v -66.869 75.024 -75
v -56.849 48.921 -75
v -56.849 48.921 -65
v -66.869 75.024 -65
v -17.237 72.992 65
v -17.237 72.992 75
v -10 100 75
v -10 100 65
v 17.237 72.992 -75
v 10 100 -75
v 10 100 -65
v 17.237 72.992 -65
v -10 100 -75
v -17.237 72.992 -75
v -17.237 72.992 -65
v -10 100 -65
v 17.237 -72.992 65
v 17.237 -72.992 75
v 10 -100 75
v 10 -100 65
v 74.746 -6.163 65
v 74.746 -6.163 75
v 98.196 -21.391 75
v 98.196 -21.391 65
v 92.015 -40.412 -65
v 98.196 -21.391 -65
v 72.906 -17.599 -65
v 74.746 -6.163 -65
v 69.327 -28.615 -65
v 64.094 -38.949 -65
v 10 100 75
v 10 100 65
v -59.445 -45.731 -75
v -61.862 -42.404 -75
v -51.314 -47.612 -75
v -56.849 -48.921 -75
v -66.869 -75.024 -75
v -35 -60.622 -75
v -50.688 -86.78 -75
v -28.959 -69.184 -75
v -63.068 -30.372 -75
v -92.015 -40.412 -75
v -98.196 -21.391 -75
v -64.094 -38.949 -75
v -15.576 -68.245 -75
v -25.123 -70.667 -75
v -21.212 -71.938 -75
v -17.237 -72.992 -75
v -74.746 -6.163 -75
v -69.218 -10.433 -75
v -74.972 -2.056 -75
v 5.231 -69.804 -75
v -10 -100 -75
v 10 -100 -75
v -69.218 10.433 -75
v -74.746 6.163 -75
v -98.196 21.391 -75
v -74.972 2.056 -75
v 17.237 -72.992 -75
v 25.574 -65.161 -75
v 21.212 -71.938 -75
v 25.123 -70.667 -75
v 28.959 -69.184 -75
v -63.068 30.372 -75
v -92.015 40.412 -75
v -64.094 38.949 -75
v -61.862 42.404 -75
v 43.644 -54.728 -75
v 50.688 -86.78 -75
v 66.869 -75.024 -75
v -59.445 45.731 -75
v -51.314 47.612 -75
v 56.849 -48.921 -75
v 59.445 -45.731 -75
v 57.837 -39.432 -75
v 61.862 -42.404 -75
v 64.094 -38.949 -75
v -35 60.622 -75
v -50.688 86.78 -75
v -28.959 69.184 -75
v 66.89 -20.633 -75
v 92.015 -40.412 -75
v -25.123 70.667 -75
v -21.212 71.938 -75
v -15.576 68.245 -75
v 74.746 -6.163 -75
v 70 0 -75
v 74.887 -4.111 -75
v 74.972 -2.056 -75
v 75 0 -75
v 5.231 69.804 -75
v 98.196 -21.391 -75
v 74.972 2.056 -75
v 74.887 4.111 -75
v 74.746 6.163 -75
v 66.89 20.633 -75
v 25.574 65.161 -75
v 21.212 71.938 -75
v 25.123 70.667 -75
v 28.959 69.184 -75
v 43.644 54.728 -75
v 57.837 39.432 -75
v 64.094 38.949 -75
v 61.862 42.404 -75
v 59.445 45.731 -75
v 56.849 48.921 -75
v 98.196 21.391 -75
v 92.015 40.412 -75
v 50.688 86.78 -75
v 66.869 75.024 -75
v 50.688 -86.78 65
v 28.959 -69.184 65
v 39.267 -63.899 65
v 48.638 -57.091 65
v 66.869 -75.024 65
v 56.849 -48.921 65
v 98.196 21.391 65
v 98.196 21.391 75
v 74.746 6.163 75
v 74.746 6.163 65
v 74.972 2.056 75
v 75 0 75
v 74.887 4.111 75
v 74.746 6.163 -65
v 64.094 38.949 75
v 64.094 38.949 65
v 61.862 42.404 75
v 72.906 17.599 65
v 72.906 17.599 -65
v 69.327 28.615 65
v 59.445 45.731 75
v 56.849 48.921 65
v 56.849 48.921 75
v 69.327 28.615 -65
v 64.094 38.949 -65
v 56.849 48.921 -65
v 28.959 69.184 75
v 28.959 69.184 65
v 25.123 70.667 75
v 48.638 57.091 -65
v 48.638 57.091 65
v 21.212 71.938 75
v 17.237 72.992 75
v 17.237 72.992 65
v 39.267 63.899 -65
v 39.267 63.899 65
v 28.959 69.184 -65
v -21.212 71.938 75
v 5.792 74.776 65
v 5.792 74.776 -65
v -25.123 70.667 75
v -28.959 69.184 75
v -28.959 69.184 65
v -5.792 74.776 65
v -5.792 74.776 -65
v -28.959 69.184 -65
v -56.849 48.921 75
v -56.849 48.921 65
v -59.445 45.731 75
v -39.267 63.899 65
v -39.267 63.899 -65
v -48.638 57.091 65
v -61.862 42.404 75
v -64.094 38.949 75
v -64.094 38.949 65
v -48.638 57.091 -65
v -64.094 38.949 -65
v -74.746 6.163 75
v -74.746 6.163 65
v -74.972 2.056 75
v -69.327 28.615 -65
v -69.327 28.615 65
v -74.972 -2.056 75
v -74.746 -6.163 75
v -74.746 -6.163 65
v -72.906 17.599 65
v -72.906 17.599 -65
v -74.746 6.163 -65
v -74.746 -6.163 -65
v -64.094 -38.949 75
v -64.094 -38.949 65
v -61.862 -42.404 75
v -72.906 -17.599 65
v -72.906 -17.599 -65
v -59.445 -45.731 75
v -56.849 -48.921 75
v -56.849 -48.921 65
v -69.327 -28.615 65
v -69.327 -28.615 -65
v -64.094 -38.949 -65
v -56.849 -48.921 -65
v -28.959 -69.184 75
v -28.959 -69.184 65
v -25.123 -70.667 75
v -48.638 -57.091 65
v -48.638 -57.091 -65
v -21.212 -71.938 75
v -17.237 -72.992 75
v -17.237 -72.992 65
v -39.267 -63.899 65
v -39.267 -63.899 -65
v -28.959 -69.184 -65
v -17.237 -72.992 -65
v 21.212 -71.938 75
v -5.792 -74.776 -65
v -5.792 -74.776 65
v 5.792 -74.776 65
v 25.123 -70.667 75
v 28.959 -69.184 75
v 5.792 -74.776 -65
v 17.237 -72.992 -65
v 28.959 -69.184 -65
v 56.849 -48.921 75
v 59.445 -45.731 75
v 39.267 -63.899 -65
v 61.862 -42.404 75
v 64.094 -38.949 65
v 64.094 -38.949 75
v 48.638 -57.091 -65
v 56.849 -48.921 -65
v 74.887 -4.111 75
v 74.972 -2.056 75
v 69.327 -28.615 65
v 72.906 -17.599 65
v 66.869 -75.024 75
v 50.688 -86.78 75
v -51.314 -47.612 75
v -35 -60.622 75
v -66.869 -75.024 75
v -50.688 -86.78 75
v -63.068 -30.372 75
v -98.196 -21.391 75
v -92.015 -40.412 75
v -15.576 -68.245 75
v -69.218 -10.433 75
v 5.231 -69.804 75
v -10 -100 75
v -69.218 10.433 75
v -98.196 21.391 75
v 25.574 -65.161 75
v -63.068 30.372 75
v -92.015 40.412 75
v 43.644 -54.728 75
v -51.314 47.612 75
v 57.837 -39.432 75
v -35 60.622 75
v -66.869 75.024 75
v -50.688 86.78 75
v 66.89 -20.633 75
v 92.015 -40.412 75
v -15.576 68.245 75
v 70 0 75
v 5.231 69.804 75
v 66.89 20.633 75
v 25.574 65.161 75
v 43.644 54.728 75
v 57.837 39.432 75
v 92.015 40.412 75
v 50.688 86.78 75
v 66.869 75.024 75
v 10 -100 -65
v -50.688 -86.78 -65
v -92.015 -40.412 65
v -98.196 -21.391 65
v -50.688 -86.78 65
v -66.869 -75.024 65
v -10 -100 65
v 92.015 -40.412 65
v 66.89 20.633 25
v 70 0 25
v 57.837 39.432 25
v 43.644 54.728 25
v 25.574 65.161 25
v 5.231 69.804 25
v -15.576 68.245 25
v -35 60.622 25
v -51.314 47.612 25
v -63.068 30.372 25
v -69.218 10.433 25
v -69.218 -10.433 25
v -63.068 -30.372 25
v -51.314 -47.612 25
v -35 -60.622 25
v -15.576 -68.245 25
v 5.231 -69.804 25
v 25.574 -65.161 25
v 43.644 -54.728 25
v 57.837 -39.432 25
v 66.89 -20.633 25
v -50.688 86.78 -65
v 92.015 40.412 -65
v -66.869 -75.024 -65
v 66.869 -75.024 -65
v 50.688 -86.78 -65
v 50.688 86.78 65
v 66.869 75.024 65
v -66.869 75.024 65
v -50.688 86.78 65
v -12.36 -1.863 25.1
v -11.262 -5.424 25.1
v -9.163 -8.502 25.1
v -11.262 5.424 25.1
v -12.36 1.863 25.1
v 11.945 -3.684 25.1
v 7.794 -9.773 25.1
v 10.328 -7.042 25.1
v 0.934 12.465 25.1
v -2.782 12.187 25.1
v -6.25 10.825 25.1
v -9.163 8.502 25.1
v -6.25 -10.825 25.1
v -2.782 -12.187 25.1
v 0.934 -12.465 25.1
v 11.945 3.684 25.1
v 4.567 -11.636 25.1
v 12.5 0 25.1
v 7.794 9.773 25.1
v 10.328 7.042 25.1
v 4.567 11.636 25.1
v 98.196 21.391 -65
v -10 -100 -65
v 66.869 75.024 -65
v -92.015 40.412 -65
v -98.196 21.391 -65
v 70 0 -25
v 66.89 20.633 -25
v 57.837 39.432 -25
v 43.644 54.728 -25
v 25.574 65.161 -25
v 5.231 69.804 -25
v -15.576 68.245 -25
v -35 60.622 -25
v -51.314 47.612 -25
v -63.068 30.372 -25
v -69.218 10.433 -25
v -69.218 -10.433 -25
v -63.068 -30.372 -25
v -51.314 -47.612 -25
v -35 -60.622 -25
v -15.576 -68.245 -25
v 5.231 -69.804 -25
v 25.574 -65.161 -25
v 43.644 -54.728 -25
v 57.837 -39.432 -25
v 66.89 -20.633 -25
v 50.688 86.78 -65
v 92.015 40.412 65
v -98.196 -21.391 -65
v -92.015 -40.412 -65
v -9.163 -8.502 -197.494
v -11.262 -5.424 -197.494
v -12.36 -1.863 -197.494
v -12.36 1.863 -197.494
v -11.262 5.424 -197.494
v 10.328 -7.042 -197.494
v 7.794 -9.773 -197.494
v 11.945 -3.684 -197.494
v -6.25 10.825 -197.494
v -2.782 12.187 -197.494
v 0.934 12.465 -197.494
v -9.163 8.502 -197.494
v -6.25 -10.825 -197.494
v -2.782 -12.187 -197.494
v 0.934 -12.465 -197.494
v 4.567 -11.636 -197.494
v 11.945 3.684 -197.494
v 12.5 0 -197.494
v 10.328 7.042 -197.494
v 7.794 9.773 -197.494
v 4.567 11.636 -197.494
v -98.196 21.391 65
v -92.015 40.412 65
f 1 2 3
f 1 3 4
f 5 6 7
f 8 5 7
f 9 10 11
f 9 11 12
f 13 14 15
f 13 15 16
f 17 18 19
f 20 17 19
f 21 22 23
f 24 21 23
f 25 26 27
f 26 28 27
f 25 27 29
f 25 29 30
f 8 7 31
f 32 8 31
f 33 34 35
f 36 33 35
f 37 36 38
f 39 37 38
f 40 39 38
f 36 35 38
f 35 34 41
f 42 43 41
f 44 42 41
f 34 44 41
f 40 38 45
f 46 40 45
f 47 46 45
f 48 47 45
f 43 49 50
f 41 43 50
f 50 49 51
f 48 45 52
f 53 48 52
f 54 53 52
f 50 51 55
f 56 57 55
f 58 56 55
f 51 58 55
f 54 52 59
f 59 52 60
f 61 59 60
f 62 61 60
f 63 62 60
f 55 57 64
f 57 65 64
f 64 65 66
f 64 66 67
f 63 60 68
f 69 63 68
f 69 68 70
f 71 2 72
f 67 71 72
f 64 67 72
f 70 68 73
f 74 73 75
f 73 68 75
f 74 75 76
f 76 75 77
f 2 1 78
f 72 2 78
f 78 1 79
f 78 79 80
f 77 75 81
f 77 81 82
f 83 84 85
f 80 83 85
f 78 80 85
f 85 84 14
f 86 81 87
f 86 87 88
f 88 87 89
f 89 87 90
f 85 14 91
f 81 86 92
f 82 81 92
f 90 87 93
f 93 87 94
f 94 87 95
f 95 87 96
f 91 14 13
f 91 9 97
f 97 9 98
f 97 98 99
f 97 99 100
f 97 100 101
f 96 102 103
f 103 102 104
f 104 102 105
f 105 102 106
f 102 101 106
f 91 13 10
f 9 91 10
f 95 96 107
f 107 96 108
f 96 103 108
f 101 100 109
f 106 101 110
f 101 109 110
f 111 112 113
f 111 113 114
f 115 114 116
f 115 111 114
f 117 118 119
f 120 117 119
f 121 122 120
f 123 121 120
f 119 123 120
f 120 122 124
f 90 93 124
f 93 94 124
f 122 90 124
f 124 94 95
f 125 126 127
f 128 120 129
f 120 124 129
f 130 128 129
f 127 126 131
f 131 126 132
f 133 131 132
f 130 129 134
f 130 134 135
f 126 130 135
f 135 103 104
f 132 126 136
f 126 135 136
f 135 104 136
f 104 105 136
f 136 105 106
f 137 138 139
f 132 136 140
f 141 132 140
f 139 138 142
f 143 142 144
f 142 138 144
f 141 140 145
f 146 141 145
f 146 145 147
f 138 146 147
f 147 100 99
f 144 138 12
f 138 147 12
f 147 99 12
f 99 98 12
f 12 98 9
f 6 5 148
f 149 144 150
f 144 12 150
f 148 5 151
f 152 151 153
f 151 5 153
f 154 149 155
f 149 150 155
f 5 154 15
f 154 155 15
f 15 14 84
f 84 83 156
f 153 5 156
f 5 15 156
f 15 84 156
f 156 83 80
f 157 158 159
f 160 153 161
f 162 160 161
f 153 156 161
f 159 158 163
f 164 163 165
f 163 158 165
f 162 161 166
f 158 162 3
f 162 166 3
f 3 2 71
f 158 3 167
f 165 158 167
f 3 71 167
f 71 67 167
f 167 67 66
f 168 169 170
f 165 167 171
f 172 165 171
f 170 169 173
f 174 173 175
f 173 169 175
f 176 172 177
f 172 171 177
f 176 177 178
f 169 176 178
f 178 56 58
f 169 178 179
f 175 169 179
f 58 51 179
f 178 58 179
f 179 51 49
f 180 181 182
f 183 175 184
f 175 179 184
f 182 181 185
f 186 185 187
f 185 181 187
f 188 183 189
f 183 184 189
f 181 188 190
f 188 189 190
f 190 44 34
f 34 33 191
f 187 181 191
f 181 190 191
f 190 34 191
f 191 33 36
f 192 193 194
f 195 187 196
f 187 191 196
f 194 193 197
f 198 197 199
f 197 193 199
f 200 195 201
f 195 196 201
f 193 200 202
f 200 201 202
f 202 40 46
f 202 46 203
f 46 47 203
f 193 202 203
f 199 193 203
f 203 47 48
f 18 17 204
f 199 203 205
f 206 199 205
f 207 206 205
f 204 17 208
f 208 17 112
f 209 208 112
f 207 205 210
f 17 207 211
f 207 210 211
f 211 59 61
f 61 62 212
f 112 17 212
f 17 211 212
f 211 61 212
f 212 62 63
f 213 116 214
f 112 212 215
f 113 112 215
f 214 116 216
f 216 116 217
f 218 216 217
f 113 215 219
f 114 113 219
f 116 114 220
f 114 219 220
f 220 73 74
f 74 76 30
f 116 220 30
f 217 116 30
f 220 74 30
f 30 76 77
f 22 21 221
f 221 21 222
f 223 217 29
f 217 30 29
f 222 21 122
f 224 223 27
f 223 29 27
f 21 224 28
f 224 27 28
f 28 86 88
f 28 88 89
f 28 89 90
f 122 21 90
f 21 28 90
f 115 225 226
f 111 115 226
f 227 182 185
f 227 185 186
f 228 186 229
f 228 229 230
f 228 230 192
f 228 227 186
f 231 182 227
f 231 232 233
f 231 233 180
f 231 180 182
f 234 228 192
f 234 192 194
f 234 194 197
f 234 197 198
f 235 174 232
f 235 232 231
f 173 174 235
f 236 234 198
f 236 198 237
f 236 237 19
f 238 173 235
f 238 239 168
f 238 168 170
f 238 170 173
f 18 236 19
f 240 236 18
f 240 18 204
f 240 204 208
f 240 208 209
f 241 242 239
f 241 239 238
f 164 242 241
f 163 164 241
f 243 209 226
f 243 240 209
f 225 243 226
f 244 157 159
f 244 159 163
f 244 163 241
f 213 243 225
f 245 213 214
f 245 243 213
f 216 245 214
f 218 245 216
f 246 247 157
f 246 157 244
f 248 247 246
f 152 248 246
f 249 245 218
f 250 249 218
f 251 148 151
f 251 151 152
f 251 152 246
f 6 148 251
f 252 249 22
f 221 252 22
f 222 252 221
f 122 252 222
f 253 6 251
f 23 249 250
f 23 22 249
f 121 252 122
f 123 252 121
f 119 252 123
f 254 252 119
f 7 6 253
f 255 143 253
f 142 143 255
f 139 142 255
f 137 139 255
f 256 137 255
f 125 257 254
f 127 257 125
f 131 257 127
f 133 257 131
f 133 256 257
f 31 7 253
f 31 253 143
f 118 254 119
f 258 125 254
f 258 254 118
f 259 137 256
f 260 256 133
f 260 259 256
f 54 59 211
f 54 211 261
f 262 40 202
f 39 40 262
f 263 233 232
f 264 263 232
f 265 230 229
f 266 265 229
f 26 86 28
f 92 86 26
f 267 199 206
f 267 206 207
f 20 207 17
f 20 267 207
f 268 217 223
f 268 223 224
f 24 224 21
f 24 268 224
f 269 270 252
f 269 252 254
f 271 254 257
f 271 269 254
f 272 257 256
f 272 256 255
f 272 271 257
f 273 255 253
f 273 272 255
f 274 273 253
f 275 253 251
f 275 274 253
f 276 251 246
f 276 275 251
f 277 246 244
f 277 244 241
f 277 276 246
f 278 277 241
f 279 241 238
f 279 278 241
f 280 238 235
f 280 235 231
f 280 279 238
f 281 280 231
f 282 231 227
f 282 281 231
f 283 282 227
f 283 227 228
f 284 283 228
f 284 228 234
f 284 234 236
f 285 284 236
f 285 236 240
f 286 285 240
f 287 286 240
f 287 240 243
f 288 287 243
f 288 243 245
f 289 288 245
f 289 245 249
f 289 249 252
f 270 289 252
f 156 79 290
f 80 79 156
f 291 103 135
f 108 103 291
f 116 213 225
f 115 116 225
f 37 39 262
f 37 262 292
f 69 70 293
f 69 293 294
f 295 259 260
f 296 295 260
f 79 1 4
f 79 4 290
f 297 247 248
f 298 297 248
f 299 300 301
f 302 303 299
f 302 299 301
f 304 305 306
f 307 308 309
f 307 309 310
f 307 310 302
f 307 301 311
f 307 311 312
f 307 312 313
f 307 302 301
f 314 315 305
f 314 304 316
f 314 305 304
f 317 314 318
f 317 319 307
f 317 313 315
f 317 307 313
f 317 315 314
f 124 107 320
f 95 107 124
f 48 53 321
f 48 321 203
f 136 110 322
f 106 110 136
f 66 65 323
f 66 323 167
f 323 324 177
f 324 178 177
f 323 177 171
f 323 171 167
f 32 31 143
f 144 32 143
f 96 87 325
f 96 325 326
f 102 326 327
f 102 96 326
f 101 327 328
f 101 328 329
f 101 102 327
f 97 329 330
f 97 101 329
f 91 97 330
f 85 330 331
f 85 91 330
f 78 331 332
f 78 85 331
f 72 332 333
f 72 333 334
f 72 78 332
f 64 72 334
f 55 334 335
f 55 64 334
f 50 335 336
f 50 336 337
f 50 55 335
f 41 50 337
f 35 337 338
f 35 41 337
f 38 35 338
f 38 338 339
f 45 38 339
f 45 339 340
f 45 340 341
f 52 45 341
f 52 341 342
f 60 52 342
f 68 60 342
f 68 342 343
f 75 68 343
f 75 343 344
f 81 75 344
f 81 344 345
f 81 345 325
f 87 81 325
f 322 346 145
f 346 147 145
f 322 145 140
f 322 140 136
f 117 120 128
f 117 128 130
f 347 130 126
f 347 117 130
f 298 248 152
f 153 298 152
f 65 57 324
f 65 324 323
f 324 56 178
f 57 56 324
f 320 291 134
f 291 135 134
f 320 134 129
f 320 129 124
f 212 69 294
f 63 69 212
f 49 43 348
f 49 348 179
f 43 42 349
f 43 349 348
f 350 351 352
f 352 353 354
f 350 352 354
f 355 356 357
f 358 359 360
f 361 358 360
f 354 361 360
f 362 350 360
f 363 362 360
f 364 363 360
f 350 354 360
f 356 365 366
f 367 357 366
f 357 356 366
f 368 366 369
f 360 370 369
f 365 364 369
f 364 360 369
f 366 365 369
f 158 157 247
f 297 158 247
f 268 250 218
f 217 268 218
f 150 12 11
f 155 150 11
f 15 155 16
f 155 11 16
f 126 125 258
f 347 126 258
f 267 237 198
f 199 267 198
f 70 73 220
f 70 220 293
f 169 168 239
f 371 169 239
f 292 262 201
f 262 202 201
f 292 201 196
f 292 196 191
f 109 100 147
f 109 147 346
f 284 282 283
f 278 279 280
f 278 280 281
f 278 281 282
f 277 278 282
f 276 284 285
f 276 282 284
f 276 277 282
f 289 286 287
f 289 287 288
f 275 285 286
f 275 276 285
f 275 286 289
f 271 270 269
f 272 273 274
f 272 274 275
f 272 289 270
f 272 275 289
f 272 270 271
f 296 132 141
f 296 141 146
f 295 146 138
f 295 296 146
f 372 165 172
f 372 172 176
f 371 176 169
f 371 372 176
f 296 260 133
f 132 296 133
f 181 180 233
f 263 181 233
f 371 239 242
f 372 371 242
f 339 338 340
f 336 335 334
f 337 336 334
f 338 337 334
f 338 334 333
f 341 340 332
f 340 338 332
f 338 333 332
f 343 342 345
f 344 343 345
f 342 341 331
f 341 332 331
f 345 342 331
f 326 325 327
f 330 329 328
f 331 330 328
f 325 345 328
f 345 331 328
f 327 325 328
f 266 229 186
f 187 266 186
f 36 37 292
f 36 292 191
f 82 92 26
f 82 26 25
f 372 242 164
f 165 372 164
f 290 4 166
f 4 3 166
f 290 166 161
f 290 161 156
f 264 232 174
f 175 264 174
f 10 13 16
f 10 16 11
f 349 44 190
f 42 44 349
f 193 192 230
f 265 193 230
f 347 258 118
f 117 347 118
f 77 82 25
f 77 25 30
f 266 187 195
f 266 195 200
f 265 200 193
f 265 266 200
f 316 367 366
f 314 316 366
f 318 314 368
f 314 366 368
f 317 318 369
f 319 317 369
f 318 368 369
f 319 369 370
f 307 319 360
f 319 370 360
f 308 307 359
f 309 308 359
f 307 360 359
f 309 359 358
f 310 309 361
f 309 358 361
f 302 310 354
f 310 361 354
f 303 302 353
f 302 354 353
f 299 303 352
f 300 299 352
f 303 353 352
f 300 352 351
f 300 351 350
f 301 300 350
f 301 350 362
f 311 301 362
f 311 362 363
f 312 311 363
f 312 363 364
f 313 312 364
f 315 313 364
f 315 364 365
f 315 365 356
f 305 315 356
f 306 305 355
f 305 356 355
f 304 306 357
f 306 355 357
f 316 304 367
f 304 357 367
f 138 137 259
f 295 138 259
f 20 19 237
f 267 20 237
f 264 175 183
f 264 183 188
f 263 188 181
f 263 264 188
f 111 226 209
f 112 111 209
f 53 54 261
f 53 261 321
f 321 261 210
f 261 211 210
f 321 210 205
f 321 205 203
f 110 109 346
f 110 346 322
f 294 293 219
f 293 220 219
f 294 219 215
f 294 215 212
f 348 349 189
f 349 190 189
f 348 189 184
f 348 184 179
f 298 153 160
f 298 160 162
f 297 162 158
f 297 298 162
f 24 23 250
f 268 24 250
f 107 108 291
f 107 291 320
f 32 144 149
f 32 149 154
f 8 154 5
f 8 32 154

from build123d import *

# Parameters (mm, degrees)
BOSS_EXTRUDE1_DEPTH      = 25
BOSS_EXTRUDE1_DEPTH_BACK = 25
SKETCH2_R                = 70
BOSS_EXTRUDE2_DEPTH      = 50
BOSS_EXTRUDE2_DEPTH_BACK = 100
SKETCH3_R                = 75
SKETCH3_R_2              = 70
BOSS_EXTRUDE3_DEPTH      = 10
CIRPATTERN1_COUNT        = 10
MIRROR1_COPY_1_DEPTH     = 10
MIRROR1_COPY_2_DEPTH     = 10
MIRROR1_COPY_3_DEPTH     = 10
MIRROR1_COPY_4_DEPTH     = 10
MIRROR1_COPY_5_DEPTH     = 10
MIRROR1_COPY_6_DEPTH     = 10
MIRROR1_COPY_7_DEPTH     = 10
MIRROR1_COPY_8_DEPTH     = 10
MIRROR1_COPY_9_DEPTH     = 10
MIRROR1_COPY_10_DEPTH    = 10
BOSS_EXTRUDE4_DEPTH      = 0.1
BOSS_EXTRUDE4_DEPTH_BACK = 222.49372628
SKETCH5_R                = 12.5


with BuildPart() as part:
    # Sketch2 → Boss-Extrude1 (new, two sides: drawn at the far end of the back side and taken through both)
    with BuildSketch(Plane.XY.offset(-BOSS_EXTRUDE1_DEPTH_BACK)):
        Circle(SKETCH2_R)
    extrude(amount=BOSS_EXTRUDE1_DEPTH + BOSS_EXTRUDE1_DEPTH_BACK)

    # Sketch3 → Boss-Extrude2 (add, two sides: drawn at the far end of the back side and taken through both)
    with BuildSketch(Plane.XY.offset(25).offset(-BOSS_EXTRUDE2_DEPTH_BACK)):
        Circle(SKETCH3_R)
        Circle(SKETCH3_R_2, mode=Mode.SUBTRACT)
    extrude(amount=BOSS_EXTRUDE2_DEPTH + BOSS_EXTRUDE2_DEPTH_BACK)

    # Sketch4 → Boss-Extrude3 (add)
    with BuildSketch(Plane.XY.offset(75)):
        with BuildLine():
            Line((-10, 100), (10, 100))
            Line((10, 100), (17.23665102, 72.992450717))
            ThreePointArc((17.23665102, 72.992450717), (0, 75), (-17.23665102, 72.992450717))
            Line((-17.23665102, 72.992450717), (-10, 100))
        make_face()
    boss_extrude3 = extrude(amount=-BOSS_EXTRUDE3_DEPTH)

    # CirPattern1: Boss-Extrude3 ×10 about axis
    cirpattern1_axis = Axis((0, 0, 75), (0, 0, 1))
    for i in range(1, CIRPATTERN1_COUNT):
        add(boss_extrude3.rotate(cirpattern1_axis, i * 360 / CIRPATTERN1_COUNT))

    # Mirror1 copy 1 sketch → Mirror1 copy 1 (add)
    with BuildSketch(Plane(origin=(0, 0, -75), x_dir=(0.8090169943749475, 0.5877852522924731, 0), z_dir=(0, 0, -1))):
        with BuildLine():
            Line((-10, -100), (10, -100))
            Line((10, -100), (17.23665102, -72.992450717))
            ThreePointArc((17.23665102, -72.992450717), (0, -75), (-17.23665102, -72.992450717))
            Line((-17.23665102, -72.992450717), (-10, -100))
        make_face()
    extrude(amount=-MIRROR1_COPY_1_DEPTH)

    # Mirror1 copy 2 sketch → Mirror1 copy 2 (add)
    with BuildSketch(Plane(origin=(0, 0, -75), x_dir=(0.30901699437494745, 0.9510565162951535, 0), z_dir=(0, 0, -1))):
        with BuildLine():
            Line((-10, -100), (10, -100))
            Line((10, -100), (17.23665102, -72.992450717))
            ThreePointArc((17.23665102, -72.992450717), (0, -75), (-17.23665102, -72.992450717))
            Line((-17.23665102, -72.992450717), (-10, -100))
        make_face()
    extrude(amount=-MIRROR1_COPY_2_DEPTH)

    # Mirror1 copy 3 sketch → Mirror1 copy 3 (add)
    with BuildSketch(Plane(origin=(0, 0, -75), x_dir=(-0.30901699437494734, 0.9510565162951536, 0), z_dir=(0, 0, -1))):
        with BuildLine():
            Line((-10, -100), (10, -100))
            Line((10, -100), (17.23665102, -72.992450717))
            ThreePointArc((17.23665102, -72.992450717), (0, -75), (-17.23665102, -72.992450717))
            Line((-17.23665102, -72.992450717), (-10, -100))
        make_face()
    extrude(amount=-MIRROR1_COPY_3_DEPTH)

    # Mirror1 copy 4 sketch → Mirror1 copy 4 (add)
    with BuildSketch(Plane(origin=(0, 0, -75), x_dir=(-0.8090169943749473, 0.5877852522924732, 0), z_dir=(0, 0, -1))):
        with BuildLine():
            Line((-10, -100), (10, -100))
            Line((10, -100), (17.23665102, -72.992450717))
            ThreePointArc((17.23665102, -72.992450717), (0, -75), (-17.23665102, -72.992450717))
            Line((-17.23665102, -72.992450717), (-10, -100))
        make_face()
    extrude(amount=-MIRROR1_COPY_4_DEPTH)

    # Mirror1 copy 5 sketch → Mirror1 copy 5 (add)
    with BuildSketch(Plane(origin=(0, 0, -75), x_dir=(-1, 0, 0), z_dir=(0, 0, -1))):
        with BuildLine():
            Line((-10, -100), (10, -100))
            Line((10, -100), (17.23665102, -72.992450717))
            ThreePointArc((17.23665102, -72.992450717), (0, -75), (-17.23665102, -72.992450717))
            Line((-17.23665102, -72.992450717), (-10, -100))
        make_face()
    extrude(amount=-MIRROR1_COPY_5_DEPTH)

    # Mirror1 copy 6 sketch → Mirror1 copy 6 (add)
    with BuildSketch(Plane(origin=(0, 0, -75), x_dir=(-0.8090169943749476, -0.587785252292473, 0), z_dir=(0, 0, -1))):
        with BuildLine():
            Line((-10, -100), (10, -100))
            Line((10, -100), (17.23665102, -72.992450717))
            ThreePointArc((17.23665102, -72.992450717), (0, -75), (-17.23665102, -72.992450717))
            Line((-17.23665102, -72.992450717), (-10, -100))
        make_face()
    extrude(amount=-MIRROR1_COPY_6_DEPTH)

    # Mirror1 copy 7 sketch → Mirror1 copy 7 (add)
    with BuildSketch(Plane(origin=(0, 0, -75), x_dir=(-0.30901699437494756, -0.9510565162951535, 0), z_dir=(0, 0, -1))):
        with BuildLine():
            Line((-10, -100), (10, -100))
            Line((10, -100), (17.23665102, -72.992450717))
            ThreePointArc((17.23665102, -72.992450717), (0, -75), (-17.23665102, -72.992450717))
            Line((-17.23665102, -72.992450717), (-10, -100))
        make_face()
    extrude(amount=-MIRROR1_COPY_7_DEPTH)

    # Mirror1 copy 8 sketch → Mirror1 copy 8 (add)
    with BuildSketch(Plane(origin=(0, 0, -75), x_dir=(0.30901699437494723, -0.9510565162951536, 0), z_dir=(0, 0, -1))):
        with BuildLine():
            Line((-10, -100), (10, -100))
            Line((10, -100), (17.23665102, -72.992450717))
            ThreePointArc((17.23665102, -72.992450717), (0, -75), (-17.23665102, -72.992450717))
            Line((-17.23665102, -72.992450717), (-10, -100))
        make_face()
    extrude(amount=-MIRROR1_COPY_8_DEPTH)

    # Mirror1 copy 9 sketch → Mirror1 copy 9 (add)
    with BuildSketch(Plane(origin=(0, 0, -75), x_dir=(0.8090169943749473, -0.5877852522924734, 0), z_dir=(0, 0, -1))):
        with BuildLine():
            Line((-10, -100), (10, -100))
            Line((10, -100), (17.23665102, -72.992450717))
            ThreePointArc((17.23665102, -72.992450717), (0, -75), (-17.23665102, -72.992450717))
            Line((-17.23665102, -72.992450717), (-10, -100))
        make_face()
    extrude(amount=-MIRROR1_COPY_9_DEPTH)

    # Mirror1 copy 10 sketch → Mirror1 copy 10 (add)
    with BuildSketch(Plane(origin=(0, 0, -75), x_dir=(1, 0, 0), z_dir=(0, 0, -1))):
        with BuildLine():
            Line((-10, -100), (10, -100))
            Line((10, -100), (17.23665102, -72.992450717))
            ThreePointArc((17.23665102, -72.992450717), (0, -75), (-17.23665102, -72.992450717))
            Line((-17.23665102, -72.992450717), (-10, -100))
        make_face()
    extrude(amount=-MIRROR1_COPY_10_DEPTH)


with BuildPart() as body_2:
    # Sketch5 → Boss-Extrude4 (new, two sides: drawn at the far end of the back side and taken through both)
    with BuildSketch(Plane.XY.offset(25).offset(-BOSS_EXTRUDE4_DEPTH_BACK)):
        Circle(SKETCH5_R)
    extrude(amount=BOSS_EXTRUDE4_DEPTH + BOSS_EXTRUDE4_DEPTH_BACK)


solid = Compound([part.part, body_2.part])
